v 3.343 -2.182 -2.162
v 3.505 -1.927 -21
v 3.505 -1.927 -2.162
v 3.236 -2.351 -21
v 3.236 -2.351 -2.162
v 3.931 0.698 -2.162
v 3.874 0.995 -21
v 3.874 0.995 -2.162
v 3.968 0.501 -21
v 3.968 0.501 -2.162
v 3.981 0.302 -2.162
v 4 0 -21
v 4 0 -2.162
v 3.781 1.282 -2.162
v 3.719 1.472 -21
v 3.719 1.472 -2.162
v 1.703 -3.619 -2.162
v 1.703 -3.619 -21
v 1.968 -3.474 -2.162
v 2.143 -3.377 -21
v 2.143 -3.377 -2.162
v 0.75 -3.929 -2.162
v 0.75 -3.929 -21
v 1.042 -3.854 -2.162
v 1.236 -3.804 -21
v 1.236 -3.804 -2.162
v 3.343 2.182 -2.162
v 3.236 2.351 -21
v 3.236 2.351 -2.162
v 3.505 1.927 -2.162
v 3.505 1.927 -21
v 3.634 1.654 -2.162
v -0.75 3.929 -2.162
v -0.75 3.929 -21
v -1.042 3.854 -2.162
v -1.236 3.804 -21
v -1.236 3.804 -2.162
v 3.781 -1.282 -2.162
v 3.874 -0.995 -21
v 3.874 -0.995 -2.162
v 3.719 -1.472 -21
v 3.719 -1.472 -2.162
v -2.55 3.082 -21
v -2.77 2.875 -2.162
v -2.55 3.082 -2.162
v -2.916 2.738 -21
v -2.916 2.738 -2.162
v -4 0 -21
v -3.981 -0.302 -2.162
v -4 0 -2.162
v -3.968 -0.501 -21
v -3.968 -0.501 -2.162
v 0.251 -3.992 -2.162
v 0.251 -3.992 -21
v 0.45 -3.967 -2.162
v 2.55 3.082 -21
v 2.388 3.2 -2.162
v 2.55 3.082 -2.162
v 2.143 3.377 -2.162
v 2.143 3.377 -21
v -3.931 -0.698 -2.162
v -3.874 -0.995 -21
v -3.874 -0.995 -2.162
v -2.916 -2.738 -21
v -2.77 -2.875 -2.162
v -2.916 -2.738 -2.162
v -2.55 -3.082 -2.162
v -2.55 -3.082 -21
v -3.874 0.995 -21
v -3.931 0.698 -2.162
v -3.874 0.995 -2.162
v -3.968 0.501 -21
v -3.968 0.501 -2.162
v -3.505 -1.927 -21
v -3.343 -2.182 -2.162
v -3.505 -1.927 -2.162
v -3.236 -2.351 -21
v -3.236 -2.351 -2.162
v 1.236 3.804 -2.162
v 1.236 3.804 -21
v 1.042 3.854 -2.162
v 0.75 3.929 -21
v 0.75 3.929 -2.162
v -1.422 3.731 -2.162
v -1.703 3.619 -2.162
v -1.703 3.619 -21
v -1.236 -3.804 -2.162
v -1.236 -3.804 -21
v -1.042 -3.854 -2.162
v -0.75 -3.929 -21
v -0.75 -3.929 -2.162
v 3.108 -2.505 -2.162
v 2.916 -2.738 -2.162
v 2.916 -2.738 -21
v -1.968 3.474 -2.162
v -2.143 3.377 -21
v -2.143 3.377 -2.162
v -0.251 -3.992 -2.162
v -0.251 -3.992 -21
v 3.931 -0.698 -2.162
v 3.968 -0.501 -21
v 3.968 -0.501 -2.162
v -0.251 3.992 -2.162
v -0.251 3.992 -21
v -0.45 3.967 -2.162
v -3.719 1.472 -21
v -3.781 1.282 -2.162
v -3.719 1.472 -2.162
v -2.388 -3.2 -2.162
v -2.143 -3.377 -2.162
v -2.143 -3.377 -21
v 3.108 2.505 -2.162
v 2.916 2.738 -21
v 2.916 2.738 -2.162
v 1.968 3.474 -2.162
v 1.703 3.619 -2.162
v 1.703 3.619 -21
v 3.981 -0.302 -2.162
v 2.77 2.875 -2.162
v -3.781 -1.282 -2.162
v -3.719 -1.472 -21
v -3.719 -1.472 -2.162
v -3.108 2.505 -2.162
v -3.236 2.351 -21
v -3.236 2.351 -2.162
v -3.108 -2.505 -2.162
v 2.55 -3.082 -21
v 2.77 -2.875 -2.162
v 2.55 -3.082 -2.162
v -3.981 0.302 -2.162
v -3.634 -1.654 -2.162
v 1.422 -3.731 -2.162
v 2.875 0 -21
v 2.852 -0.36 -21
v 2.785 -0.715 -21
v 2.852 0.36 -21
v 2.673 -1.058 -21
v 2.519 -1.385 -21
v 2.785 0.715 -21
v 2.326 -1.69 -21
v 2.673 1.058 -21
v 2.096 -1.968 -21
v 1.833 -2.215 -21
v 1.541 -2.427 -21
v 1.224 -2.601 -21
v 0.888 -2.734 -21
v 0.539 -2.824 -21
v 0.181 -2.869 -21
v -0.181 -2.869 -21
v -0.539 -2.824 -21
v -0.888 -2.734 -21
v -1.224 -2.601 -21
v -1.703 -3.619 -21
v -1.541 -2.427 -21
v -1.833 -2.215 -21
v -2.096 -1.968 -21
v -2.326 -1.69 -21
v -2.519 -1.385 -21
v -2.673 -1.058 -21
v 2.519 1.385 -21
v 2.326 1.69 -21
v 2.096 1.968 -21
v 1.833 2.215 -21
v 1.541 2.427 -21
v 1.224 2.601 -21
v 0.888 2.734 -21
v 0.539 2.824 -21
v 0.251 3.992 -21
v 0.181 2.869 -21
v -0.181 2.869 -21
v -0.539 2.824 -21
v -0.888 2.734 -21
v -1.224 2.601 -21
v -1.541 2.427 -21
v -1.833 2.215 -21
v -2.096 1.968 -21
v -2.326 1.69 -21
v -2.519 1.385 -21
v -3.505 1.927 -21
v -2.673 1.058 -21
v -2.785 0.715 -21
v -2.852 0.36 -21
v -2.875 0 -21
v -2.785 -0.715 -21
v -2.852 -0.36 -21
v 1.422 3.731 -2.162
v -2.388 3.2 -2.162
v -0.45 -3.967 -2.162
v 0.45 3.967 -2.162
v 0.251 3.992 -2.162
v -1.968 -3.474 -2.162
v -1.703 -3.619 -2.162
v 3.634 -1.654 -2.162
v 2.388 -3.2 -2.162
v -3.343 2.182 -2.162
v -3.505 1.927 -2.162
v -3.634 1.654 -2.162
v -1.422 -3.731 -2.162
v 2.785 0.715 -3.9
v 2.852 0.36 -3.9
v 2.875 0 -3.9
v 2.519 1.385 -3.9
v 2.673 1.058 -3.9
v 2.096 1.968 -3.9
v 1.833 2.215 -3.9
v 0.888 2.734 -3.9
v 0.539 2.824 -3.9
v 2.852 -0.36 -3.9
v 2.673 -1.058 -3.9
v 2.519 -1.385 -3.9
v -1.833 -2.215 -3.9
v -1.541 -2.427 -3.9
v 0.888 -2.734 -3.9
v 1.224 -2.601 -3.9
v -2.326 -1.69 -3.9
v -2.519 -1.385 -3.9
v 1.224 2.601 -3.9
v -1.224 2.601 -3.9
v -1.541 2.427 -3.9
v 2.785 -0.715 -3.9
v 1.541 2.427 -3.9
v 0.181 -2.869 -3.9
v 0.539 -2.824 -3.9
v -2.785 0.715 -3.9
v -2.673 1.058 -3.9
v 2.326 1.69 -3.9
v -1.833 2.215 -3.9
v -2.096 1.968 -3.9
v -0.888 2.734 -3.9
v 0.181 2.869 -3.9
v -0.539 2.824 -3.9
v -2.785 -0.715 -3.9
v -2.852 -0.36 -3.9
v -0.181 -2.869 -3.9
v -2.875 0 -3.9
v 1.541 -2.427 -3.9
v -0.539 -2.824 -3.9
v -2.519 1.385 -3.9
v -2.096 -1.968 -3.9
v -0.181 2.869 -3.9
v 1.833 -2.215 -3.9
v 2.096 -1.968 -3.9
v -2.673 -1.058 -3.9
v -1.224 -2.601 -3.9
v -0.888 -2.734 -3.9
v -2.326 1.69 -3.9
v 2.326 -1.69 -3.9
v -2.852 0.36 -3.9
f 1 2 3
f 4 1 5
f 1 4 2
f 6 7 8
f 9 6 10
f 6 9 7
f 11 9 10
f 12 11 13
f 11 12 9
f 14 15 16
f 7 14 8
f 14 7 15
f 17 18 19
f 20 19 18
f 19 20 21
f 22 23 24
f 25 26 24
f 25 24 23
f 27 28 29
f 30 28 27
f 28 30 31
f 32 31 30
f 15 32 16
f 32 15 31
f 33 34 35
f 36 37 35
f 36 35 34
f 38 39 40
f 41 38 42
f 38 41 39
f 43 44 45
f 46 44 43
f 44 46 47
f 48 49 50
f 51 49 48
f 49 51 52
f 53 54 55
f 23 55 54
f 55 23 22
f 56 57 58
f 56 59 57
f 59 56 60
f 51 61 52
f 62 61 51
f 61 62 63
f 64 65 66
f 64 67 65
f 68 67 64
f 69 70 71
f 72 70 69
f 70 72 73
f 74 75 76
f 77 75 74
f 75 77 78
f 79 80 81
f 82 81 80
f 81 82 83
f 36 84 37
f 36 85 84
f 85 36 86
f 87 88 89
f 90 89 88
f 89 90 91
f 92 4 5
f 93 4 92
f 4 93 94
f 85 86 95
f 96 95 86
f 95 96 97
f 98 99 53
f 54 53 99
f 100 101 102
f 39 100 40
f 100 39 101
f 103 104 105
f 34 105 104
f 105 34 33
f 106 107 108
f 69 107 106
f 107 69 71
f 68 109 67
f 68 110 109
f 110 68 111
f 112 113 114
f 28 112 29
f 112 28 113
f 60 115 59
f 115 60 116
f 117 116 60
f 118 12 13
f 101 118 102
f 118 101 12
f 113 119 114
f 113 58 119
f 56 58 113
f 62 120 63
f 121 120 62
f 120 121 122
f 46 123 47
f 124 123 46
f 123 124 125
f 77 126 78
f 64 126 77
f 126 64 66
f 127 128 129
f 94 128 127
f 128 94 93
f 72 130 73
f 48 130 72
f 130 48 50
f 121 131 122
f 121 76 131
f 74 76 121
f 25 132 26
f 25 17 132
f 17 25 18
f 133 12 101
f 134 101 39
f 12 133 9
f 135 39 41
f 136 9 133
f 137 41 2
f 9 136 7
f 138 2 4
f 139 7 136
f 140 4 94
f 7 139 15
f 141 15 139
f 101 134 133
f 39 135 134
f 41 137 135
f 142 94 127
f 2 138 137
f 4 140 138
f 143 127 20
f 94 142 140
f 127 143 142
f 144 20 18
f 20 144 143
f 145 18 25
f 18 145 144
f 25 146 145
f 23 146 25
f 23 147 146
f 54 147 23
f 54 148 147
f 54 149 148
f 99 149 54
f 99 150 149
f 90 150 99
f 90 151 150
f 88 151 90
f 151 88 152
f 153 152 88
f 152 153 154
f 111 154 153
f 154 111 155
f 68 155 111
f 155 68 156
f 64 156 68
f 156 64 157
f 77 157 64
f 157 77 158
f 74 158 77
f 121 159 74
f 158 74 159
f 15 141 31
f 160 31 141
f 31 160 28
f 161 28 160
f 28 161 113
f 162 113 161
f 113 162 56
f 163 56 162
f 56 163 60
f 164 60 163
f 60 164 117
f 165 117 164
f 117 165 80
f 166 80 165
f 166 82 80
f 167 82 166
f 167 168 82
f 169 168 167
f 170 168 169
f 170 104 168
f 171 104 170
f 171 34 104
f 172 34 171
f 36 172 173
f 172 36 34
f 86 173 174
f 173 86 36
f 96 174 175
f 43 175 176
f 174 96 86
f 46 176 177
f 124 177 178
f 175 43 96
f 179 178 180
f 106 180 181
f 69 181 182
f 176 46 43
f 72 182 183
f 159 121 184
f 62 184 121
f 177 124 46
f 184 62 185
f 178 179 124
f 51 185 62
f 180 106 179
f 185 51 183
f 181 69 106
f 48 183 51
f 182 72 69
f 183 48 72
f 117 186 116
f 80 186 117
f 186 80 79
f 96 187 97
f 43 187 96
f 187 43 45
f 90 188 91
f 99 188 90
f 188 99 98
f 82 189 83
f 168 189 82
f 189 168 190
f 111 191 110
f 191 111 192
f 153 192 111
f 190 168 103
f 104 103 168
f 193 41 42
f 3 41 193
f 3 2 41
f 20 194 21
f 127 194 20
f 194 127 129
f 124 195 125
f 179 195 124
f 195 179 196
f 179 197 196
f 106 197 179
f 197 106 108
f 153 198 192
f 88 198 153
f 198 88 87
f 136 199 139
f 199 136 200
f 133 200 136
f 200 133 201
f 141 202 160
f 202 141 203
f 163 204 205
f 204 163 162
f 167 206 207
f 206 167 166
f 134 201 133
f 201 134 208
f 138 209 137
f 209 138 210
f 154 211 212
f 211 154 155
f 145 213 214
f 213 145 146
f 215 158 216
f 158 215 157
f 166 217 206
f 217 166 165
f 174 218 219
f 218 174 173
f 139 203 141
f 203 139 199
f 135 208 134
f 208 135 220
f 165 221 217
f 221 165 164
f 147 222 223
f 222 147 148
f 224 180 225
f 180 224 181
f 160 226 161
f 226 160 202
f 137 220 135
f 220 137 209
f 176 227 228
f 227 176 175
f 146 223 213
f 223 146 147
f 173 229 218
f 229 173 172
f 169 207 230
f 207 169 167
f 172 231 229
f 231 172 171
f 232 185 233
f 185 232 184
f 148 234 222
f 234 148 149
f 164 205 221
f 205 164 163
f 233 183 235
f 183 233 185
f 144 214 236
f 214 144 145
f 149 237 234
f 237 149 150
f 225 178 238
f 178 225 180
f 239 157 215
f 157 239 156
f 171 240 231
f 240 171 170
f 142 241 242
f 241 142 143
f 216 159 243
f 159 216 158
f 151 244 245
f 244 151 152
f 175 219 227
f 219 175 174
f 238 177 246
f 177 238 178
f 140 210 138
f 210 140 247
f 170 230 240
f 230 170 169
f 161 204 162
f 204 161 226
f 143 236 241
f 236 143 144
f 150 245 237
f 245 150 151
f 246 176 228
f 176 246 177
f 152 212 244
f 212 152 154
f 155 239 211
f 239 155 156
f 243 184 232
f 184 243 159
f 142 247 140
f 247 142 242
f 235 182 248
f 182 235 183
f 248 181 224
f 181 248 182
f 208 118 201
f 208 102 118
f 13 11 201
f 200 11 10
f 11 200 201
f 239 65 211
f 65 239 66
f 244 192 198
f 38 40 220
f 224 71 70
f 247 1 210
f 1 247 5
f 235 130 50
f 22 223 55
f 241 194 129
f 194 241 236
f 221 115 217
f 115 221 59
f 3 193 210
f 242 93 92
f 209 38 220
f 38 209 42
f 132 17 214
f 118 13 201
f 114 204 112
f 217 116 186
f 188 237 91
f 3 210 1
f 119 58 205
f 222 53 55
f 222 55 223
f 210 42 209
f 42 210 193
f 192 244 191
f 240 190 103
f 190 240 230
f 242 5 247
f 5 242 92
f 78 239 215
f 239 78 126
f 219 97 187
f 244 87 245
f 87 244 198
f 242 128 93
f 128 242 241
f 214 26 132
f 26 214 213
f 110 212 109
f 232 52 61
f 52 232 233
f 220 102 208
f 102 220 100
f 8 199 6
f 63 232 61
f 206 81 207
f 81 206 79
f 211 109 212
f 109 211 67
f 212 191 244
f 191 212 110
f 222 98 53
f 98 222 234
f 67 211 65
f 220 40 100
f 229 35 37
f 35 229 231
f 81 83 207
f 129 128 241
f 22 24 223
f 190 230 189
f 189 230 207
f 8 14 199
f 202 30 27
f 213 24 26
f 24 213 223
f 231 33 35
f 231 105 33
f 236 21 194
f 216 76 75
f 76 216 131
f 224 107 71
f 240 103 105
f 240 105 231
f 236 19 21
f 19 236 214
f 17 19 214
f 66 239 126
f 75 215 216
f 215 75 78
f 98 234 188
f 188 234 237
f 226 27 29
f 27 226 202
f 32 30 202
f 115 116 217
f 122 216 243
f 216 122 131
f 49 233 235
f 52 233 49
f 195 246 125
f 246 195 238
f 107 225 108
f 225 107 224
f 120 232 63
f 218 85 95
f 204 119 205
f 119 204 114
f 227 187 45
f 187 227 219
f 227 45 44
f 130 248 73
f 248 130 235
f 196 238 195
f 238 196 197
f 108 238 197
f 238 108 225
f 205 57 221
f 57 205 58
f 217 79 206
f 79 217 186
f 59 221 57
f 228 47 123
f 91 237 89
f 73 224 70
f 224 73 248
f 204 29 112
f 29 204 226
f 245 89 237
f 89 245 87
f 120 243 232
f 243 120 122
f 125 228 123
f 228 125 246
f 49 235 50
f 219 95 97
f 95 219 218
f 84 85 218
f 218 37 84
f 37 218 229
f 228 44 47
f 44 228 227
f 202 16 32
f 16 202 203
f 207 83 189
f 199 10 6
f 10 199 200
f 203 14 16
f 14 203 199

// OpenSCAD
$fn = 50;

difference() {
	union() {
		translate(v = [0, 0, -21.0]) {
			cylinder(h = 21, r = 4.0);
		}
		#translate(v = [0, 0, -24.0]) {
			cylinder(h = 24, r = 2.875);
		}
	}
	union() {
		translate(v = [0, 0, 0]) {
			rotate(a = [0, 0, 0]) {
				difference() {
					union() {
						translate(v = [0, 0, -24.0]) {
							cylinder(h = 24, r = 2.6);
						}
						translate(v = [0, 0, -3.9]) {
							cylinder(h = 3.9, r1 = 2.875, r2 = 5.4);
						}
						translate(v = [0, 0, -24.0]) {
							cylinder(h = 24, r = 2.875);
						}
						translate(v = [0, 0, -24.0]) {
							cylinder(h = 24, r = 2.6);
						}
					}
					union();
				}
			}
		}
	}
}
